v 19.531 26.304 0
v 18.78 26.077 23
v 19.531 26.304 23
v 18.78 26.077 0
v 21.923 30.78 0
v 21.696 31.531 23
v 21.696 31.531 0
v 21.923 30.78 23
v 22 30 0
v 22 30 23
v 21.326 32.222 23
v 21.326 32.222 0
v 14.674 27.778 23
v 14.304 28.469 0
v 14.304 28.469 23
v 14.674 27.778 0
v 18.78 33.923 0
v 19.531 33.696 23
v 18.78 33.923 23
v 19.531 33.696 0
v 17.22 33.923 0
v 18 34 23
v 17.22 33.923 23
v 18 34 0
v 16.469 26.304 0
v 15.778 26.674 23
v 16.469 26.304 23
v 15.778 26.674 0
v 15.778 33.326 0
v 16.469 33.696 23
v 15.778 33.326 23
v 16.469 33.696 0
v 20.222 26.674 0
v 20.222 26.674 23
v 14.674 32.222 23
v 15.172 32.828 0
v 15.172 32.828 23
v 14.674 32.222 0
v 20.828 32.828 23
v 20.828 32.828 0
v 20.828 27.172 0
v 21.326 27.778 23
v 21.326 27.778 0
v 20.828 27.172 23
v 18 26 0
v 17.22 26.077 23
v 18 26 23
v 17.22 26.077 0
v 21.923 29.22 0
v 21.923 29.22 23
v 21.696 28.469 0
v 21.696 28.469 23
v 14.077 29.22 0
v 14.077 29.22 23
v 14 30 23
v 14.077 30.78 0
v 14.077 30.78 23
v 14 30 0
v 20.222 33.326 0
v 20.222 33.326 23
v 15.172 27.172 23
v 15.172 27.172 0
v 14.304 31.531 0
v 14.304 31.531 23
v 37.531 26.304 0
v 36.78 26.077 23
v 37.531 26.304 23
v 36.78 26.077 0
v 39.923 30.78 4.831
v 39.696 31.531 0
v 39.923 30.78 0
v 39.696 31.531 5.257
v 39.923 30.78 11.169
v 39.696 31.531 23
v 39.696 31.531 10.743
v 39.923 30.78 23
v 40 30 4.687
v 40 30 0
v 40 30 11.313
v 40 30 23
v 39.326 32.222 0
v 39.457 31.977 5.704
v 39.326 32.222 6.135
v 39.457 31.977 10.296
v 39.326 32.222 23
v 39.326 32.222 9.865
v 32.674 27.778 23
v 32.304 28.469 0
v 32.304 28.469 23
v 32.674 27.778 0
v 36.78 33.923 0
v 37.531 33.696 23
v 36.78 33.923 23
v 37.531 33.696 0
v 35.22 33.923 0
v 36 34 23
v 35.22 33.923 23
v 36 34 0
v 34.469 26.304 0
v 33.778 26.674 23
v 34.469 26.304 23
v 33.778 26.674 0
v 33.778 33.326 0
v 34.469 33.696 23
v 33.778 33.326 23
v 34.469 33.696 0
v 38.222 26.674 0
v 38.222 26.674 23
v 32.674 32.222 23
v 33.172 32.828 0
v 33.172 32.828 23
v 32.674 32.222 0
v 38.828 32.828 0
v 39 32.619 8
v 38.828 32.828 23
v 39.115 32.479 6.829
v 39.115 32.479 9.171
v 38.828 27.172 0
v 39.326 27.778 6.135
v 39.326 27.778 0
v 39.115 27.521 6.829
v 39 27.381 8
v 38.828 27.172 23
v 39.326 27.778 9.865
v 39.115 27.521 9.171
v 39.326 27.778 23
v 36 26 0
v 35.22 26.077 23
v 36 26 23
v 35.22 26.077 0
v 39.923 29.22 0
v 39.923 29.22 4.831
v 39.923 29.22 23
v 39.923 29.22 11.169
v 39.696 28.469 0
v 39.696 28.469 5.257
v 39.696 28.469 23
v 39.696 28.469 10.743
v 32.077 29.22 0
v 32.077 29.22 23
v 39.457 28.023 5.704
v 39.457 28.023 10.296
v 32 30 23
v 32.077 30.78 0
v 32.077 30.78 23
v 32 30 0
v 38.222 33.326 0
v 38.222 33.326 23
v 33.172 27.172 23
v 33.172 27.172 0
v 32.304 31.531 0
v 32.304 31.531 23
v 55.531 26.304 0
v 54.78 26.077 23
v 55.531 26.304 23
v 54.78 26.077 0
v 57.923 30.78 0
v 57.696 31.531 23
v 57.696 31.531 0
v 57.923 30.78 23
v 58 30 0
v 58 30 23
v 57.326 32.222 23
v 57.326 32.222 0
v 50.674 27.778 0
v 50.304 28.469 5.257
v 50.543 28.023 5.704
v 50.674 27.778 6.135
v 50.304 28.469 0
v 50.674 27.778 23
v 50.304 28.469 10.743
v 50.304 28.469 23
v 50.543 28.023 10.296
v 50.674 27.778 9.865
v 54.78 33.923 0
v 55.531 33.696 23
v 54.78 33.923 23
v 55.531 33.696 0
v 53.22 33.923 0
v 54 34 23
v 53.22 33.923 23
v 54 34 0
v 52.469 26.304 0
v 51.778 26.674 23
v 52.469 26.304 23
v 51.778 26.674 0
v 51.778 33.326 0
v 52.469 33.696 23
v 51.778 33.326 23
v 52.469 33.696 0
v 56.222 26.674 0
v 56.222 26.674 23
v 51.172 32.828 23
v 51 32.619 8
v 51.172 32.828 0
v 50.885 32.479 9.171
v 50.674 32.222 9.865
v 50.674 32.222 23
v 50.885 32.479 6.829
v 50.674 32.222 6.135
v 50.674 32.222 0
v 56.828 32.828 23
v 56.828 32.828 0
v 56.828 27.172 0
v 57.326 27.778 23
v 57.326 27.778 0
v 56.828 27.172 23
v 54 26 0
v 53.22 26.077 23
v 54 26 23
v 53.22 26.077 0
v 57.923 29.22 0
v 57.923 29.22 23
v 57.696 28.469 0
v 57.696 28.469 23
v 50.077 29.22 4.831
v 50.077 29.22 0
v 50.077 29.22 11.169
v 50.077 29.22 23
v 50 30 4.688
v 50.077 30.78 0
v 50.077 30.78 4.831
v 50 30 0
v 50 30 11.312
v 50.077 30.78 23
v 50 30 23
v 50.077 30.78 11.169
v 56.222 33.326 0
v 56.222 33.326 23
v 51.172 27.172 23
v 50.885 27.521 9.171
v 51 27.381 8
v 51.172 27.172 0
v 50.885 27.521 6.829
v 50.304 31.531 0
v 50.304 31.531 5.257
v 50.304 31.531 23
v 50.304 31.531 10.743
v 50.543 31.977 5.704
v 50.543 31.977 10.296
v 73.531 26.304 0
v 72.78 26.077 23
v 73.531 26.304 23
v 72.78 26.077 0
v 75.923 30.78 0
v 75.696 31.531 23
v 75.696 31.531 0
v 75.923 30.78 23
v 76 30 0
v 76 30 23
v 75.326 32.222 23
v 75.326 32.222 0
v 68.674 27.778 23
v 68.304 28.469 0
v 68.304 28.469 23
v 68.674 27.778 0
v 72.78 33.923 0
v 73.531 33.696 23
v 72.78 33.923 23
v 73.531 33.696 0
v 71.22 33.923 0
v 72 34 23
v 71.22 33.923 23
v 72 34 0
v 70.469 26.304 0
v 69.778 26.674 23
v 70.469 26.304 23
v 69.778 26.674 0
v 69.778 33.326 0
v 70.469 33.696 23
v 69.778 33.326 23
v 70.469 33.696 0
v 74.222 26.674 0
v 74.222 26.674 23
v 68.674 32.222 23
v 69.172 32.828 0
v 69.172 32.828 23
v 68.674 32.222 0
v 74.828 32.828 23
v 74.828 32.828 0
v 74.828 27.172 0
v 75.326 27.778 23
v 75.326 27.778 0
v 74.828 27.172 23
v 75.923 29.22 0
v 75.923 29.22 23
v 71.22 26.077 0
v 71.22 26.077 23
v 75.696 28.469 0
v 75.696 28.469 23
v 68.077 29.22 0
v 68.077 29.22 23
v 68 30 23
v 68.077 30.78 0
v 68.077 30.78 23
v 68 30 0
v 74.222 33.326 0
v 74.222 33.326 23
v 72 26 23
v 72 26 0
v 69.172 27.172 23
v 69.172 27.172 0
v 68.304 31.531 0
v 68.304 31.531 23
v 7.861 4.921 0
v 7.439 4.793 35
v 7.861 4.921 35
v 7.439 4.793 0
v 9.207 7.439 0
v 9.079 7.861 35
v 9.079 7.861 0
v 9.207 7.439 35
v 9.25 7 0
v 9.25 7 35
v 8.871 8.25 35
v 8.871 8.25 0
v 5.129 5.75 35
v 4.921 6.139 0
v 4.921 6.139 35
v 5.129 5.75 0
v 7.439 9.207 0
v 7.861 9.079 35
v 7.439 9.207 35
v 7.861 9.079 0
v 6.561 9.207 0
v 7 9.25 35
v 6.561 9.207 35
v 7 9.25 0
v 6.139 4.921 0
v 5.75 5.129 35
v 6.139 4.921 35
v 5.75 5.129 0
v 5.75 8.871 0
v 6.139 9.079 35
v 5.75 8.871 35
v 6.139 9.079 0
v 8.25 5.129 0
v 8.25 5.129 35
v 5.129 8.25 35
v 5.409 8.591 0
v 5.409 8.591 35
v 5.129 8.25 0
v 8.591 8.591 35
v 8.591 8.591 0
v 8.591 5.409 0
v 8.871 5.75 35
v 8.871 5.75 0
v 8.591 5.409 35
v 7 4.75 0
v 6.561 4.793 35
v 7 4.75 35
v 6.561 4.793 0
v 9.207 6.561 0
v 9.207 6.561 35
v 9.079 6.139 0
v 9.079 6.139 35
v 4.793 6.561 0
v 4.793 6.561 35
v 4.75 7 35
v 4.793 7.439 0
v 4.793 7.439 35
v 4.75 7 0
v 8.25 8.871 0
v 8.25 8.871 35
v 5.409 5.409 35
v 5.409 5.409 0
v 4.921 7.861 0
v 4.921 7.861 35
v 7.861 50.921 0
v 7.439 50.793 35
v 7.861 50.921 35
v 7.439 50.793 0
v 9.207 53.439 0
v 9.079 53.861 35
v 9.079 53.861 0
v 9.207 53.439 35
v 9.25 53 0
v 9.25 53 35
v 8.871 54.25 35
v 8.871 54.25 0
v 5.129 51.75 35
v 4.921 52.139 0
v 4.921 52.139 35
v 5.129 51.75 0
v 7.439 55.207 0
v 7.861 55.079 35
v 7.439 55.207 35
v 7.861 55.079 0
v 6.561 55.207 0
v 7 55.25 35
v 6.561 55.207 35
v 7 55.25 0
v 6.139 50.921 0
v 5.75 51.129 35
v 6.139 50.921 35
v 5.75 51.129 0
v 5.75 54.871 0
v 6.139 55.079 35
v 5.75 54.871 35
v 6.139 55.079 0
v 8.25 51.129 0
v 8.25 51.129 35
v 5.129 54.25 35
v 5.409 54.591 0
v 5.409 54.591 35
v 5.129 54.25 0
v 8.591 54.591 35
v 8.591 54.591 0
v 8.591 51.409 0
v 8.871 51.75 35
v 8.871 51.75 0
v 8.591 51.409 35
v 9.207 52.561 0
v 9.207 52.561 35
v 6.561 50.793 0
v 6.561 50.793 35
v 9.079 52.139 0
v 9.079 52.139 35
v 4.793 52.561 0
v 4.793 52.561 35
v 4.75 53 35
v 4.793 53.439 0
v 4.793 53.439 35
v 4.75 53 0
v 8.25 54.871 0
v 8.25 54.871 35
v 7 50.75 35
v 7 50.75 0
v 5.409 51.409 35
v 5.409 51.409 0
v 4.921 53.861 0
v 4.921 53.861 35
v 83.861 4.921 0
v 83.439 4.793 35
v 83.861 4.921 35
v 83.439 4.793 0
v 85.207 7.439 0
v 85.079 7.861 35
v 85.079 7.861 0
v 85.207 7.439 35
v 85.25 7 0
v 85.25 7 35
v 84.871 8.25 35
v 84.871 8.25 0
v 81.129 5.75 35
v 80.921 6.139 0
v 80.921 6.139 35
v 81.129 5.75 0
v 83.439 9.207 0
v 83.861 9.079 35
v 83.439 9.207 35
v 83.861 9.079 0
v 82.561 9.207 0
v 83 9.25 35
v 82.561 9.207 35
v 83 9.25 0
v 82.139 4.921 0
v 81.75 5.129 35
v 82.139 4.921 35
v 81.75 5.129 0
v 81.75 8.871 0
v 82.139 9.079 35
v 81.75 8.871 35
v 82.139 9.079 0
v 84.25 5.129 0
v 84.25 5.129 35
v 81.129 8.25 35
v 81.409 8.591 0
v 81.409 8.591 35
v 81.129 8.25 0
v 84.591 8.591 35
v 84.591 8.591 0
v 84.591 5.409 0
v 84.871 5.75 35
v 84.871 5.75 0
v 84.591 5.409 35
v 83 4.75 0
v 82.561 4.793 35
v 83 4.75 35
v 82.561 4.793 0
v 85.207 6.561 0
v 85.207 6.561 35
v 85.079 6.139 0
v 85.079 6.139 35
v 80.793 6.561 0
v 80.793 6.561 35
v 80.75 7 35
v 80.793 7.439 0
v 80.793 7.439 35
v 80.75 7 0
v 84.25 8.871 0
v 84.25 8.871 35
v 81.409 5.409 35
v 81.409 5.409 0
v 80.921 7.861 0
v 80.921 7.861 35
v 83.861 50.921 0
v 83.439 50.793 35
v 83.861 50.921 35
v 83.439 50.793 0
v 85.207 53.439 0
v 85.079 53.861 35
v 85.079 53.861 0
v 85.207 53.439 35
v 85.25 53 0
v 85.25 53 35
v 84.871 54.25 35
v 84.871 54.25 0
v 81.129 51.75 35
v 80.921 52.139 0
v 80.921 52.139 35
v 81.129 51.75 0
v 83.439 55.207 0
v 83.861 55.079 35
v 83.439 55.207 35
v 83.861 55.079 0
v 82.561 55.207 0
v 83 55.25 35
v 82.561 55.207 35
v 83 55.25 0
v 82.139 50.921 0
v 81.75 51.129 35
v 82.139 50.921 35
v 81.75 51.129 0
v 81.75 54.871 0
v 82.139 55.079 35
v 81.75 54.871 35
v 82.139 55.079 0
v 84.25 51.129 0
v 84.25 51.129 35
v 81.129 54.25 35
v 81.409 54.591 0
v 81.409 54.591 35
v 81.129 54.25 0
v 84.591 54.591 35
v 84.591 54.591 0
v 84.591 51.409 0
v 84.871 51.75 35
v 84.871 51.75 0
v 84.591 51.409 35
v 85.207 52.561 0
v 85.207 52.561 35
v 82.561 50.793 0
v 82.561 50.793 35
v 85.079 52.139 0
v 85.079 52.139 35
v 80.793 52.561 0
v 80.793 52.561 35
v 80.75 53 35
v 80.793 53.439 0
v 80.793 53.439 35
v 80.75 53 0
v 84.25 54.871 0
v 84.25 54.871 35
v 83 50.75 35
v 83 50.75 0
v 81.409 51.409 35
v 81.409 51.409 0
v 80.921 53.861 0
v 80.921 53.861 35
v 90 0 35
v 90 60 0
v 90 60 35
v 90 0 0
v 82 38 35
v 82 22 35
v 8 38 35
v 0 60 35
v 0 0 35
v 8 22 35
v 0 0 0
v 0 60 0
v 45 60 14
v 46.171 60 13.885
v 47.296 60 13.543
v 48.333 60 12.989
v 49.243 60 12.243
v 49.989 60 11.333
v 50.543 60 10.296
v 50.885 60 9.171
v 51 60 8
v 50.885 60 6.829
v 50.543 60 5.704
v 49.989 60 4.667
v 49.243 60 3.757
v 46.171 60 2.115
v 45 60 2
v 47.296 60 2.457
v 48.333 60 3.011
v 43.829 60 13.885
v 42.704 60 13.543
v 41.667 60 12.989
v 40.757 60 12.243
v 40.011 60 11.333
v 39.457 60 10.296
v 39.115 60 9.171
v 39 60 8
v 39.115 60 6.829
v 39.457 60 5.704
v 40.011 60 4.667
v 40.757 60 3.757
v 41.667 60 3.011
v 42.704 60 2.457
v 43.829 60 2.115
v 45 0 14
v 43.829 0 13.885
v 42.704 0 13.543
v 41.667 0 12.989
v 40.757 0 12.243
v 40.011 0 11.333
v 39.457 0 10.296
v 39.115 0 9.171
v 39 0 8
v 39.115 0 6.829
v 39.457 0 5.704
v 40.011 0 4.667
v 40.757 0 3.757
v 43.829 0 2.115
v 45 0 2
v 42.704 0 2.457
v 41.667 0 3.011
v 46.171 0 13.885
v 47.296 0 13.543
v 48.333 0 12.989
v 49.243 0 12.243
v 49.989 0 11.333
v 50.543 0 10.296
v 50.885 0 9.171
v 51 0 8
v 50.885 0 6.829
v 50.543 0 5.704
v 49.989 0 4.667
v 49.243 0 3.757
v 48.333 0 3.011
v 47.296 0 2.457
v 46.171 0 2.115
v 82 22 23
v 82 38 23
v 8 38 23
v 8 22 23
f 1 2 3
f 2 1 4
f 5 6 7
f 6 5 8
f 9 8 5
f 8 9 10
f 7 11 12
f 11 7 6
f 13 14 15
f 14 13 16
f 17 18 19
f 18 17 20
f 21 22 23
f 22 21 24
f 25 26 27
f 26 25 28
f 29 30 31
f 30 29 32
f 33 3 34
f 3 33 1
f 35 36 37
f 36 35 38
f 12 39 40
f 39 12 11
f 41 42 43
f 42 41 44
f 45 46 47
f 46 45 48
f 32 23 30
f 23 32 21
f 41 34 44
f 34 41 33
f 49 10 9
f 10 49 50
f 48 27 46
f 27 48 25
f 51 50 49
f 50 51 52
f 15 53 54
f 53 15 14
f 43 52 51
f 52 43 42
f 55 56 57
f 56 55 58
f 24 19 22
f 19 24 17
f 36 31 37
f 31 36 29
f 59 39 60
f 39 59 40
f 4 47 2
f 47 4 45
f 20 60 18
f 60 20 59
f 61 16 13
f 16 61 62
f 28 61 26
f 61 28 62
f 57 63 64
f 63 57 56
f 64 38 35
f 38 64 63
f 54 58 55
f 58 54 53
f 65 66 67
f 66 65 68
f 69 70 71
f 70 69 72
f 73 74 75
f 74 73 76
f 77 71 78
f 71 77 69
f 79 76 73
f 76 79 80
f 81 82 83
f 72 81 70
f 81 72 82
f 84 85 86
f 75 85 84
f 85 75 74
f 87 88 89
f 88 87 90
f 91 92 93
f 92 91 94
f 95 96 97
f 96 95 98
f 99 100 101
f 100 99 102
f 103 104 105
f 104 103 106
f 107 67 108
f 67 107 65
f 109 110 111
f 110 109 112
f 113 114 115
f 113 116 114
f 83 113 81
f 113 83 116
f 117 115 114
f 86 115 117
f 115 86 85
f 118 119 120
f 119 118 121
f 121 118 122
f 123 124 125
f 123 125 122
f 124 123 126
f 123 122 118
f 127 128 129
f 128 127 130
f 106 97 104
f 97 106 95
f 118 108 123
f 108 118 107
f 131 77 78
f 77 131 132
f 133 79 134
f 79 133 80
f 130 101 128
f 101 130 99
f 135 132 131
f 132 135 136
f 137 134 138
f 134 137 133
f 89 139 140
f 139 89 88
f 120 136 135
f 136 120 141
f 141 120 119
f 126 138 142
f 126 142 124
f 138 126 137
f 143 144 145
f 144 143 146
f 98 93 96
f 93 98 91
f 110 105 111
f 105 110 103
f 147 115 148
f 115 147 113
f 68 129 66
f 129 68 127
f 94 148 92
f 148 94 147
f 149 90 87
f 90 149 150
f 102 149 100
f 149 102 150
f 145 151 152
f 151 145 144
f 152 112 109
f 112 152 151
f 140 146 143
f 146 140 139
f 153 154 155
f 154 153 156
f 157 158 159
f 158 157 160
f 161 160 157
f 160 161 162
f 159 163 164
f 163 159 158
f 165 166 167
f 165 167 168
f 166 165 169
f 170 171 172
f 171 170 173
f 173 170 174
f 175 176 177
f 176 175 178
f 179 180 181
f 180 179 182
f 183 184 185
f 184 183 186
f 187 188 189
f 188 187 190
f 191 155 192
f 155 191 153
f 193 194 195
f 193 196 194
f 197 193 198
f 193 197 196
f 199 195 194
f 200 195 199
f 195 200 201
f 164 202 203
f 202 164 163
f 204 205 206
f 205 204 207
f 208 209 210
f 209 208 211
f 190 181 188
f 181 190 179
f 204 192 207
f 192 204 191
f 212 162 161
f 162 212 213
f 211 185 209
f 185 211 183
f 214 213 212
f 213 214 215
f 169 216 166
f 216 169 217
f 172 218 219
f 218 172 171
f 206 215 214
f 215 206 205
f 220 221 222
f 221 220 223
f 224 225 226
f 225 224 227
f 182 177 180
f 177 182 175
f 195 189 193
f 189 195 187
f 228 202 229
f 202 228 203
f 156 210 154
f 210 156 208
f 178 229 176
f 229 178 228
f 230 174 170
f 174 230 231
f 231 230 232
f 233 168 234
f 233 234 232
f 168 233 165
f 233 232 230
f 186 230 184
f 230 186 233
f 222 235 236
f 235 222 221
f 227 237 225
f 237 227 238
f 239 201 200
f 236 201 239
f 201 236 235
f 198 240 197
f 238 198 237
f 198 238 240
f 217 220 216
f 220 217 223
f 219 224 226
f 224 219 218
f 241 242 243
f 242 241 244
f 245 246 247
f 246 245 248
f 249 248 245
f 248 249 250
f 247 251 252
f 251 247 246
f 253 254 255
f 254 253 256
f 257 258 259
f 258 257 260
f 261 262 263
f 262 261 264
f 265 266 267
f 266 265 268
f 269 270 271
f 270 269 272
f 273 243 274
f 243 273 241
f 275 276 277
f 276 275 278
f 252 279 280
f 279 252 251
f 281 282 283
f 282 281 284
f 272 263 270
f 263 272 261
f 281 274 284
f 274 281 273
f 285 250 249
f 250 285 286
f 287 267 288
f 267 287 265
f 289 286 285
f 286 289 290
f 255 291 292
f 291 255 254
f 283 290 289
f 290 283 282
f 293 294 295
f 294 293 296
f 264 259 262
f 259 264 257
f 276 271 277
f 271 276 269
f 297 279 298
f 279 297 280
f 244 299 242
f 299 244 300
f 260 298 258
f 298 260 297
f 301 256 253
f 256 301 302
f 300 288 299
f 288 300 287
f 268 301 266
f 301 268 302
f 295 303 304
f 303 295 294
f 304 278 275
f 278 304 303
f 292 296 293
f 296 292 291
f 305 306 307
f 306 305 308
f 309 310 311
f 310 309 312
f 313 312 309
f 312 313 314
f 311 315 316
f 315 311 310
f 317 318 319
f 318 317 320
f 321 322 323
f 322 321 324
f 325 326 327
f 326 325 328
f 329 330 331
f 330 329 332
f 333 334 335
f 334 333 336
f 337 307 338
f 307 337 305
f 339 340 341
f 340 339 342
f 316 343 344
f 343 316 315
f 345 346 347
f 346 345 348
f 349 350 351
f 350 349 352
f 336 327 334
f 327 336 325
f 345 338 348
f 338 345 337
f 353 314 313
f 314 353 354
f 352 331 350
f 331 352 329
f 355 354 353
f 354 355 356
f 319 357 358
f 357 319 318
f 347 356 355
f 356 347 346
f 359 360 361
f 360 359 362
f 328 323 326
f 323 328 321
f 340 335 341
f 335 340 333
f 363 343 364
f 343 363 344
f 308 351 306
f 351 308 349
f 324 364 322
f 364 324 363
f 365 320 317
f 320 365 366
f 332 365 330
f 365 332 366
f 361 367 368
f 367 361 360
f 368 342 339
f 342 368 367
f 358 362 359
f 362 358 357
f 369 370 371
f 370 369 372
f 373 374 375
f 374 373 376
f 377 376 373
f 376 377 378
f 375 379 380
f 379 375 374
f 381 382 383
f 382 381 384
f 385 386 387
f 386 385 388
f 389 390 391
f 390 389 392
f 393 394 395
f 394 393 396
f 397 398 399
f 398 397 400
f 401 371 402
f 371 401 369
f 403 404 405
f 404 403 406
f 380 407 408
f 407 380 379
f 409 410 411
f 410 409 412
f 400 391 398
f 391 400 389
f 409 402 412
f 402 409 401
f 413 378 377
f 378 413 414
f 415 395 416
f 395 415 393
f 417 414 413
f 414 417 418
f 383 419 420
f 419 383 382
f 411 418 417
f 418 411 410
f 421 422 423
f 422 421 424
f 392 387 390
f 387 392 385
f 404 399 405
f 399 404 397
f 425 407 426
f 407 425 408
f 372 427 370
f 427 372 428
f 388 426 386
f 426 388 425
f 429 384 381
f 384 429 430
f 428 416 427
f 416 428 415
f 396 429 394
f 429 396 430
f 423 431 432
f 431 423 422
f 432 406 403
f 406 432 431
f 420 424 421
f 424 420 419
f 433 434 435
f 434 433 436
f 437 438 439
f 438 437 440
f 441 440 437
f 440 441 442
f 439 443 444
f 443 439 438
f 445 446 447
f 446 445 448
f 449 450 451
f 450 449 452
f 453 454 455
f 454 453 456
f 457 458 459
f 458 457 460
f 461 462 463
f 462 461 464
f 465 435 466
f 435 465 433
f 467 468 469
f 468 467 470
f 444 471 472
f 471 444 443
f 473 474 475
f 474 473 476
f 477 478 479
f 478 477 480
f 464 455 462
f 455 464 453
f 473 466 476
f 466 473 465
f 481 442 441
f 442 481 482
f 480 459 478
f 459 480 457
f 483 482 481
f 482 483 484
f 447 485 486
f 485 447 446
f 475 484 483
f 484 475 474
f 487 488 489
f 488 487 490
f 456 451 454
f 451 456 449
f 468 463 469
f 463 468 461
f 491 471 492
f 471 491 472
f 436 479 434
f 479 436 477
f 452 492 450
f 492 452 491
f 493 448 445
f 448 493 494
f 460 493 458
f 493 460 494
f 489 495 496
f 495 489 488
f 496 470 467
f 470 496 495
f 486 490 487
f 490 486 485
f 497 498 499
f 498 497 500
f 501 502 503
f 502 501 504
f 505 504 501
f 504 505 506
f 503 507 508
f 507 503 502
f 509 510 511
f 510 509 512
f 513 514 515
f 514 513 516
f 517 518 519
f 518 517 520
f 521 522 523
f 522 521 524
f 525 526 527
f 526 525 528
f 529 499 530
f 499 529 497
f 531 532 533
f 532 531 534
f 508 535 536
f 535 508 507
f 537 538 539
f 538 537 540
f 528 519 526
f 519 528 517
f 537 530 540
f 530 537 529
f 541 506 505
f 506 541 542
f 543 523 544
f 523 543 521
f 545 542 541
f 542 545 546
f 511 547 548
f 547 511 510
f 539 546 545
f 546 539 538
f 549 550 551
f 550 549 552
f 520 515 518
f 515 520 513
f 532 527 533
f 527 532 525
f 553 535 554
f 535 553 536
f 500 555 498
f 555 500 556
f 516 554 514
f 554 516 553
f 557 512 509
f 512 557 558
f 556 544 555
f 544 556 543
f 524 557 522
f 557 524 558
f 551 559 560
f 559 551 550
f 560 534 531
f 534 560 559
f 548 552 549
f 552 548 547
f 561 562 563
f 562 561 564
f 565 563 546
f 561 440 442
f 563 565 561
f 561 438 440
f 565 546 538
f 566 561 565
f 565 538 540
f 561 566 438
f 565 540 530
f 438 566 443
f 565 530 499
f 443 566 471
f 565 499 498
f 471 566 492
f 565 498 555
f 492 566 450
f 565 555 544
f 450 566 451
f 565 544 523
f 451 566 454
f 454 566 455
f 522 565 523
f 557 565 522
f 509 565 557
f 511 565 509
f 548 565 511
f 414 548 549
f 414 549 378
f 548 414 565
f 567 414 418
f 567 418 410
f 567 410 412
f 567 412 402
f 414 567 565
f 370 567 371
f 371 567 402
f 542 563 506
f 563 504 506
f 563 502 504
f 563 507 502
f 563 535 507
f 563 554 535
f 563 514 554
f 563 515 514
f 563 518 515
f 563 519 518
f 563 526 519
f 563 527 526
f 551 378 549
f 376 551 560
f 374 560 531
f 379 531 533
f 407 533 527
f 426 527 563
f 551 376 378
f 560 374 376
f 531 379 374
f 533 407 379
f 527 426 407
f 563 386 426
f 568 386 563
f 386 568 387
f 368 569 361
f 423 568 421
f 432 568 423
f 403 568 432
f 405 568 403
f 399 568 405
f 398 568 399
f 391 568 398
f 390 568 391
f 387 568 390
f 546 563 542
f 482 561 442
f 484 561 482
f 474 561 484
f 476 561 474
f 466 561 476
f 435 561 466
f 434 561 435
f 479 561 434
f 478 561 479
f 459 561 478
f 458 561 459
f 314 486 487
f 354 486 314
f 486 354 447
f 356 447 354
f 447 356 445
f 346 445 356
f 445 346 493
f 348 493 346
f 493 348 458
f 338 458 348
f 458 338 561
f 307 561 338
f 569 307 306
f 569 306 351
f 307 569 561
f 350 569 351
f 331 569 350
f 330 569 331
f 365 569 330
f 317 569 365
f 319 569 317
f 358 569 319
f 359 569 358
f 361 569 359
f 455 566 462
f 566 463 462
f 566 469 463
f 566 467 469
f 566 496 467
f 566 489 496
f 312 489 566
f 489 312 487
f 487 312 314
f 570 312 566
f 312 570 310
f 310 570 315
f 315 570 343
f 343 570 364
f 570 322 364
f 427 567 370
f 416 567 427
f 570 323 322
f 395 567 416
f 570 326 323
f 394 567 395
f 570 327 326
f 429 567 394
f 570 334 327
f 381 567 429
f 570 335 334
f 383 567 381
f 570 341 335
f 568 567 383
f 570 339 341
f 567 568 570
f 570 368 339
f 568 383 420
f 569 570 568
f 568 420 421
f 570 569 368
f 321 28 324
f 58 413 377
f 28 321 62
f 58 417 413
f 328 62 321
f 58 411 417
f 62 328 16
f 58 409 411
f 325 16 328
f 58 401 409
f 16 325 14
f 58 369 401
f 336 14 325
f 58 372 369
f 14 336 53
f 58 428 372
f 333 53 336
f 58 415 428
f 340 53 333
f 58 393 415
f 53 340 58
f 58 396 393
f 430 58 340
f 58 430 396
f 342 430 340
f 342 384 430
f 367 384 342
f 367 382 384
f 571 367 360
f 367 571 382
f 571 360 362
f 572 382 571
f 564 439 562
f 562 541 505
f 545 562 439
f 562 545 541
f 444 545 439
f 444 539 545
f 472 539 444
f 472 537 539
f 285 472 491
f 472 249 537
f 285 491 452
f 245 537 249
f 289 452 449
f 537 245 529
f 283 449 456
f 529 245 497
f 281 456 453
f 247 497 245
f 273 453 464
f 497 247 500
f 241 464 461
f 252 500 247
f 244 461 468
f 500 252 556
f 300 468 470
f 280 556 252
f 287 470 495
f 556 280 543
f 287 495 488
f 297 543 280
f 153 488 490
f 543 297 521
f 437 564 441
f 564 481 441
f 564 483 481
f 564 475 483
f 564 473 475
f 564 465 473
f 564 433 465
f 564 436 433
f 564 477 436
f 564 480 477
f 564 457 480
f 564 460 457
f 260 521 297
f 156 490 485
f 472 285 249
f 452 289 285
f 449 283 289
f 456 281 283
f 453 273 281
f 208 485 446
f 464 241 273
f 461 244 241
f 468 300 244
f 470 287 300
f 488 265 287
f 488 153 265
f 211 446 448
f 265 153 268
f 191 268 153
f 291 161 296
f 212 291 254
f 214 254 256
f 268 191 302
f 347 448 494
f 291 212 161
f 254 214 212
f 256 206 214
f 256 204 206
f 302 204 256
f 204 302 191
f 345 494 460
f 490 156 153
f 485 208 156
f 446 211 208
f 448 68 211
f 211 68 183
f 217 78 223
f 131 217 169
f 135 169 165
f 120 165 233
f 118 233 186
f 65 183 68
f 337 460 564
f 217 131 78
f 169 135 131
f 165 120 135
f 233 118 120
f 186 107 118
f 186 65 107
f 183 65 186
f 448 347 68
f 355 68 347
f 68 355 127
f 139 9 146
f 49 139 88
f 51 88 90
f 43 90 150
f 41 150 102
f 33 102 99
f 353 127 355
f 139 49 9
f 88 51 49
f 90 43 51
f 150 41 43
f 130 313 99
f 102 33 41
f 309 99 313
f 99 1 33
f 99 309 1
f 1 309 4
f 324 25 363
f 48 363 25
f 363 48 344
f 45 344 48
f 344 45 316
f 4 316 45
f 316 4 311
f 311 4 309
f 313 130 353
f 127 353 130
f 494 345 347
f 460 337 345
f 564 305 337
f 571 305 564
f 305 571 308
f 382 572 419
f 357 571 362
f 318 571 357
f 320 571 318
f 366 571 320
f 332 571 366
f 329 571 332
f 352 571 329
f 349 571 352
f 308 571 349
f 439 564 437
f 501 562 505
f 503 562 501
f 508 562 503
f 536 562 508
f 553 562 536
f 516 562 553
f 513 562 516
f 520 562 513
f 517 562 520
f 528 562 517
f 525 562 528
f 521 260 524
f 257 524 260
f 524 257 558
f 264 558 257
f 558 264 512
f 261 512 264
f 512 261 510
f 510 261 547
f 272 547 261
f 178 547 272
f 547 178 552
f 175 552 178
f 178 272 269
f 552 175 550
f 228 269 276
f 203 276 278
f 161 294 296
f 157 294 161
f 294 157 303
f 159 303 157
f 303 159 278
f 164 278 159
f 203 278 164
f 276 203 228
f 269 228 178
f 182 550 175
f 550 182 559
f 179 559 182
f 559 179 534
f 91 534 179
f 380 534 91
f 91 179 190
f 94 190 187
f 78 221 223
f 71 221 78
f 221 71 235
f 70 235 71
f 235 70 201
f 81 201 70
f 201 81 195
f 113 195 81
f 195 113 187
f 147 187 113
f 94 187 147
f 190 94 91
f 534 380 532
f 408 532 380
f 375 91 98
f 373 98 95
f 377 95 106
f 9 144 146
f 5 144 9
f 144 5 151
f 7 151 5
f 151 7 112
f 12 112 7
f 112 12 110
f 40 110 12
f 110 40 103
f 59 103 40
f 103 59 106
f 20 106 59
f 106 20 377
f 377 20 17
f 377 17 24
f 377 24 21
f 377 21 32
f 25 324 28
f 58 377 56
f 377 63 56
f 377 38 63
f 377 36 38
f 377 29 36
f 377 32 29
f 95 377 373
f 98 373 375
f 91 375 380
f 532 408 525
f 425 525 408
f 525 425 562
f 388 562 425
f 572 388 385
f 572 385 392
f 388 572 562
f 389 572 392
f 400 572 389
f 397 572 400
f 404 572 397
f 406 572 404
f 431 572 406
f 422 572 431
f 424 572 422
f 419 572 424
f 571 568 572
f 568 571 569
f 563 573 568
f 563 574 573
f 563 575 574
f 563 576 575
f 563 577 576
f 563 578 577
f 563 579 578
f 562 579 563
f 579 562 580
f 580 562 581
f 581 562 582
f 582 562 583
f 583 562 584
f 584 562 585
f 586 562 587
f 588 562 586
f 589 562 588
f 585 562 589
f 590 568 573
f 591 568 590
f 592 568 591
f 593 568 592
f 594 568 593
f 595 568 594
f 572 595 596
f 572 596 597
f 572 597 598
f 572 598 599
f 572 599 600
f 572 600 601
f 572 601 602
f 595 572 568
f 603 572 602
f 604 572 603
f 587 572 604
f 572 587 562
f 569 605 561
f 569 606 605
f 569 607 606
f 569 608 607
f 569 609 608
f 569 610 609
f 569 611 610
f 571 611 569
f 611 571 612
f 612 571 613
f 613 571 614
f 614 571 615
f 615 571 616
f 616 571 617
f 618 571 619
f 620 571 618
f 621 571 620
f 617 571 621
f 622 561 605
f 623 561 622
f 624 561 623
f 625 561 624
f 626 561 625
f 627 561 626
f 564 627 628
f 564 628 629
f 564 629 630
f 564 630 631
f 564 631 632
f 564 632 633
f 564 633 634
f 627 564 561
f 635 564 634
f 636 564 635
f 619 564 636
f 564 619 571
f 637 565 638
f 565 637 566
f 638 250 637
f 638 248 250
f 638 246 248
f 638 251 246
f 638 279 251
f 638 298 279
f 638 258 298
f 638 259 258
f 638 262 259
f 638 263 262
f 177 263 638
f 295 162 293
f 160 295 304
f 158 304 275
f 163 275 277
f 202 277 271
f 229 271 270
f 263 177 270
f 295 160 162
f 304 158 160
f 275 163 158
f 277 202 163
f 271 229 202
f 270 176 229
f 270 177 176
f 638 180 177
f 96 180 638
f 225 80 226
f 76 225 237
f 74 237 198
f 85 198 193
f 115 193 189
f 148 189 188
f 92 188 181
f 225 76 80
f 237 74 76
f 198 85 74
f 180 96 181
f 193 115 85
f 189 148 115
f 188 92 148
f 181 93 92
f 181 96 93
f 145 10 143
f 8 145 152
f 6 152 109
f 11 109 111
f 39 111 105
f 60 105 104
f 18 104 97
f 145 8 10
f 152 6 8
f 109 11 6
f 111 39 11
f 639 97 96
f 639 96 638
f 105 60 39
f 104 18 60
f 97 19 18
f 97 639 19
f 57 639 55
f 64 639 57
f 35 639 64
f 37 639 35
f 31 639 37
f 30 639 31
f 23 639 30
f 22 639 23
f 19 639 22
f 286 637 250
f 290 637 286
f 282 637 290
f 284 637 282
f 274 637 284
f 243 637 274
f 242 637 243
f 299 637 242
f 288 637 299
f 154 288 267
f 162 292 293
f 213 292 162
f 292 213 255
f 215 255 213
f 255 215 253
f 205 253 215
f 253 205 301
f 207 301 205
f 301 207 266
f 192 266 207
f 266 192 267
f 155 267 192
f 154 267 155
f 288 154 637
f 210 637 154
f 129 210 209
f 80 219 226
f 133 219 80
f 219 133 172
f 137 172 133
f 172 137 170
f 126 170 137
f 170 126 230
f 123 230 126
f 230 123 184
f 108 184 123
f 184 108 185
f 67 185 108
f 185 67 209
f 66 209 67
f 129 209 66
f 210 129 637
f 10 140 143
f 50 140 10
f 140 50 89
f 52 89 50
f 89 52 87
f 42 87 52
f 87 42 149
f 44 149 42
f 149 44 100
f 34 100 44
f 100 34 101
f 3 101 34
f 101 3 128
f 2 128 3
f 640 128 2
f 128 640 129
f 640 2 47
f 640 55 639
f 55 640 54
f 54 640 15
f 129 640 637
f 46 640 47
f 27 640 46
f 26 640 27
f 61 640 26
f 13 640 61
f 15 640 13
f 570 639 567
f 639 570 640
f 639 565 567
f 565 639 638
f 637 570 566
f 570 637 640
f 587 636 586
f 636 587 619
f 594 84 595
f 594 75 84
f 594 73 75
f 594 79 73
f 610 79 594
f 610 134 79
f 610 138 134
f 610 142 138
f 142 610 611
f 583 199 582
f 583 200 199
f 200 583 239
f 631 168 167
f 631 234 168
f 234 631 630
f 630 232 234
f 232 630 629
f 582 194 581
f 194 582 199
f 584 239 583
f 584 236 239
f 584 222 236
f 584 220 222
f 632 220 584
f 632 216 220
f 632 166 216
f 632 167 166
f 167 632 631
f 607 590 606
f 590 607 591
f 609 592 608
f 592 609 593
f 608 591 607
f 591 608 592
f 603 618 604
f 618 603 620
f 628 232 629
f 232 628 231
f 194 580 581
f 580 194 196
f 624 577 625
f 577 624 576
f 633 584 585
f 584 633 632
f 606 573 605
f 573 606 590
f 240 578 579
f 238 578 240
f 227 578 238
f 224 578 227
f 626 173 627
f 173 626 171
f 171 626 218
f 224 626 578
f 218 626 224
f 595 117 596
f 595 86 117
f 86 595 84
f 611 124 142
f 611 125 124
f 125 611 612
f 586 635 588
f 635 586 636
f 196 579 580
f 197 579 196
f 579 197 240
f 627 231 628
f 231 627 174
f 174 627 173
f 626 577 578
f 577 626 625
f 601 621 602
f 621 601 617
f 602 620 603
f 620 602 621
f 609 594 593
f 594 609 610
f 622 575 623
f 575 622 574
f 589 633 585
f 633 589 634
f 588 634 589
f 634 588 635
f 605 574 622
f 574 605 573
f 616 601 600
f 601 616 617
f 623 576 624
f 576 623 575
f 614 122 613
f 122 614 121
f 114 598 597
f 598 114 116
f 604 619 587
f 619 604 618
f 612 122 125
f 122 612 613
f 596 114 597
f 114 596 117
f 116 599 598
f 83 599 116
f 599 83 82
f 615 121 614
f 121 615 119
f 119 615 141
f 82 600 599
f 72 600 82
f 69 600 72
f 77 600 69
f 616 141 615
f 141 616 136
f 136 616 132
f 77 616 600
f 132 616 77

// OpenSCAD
$fn = 32;

// ----------------------------------------------------------------------
// Manifold block: side_outlet manifold
// ----------------------------------------------------------------------

// --- parameters (mm) ---
block_l = 90;             // block length, X
block_w = 60;             // block width, Y
block_h = 35;             // block height, Z
port_d = 8;               // port bore diameter
port_pitch = 18;          // port pitch along X
gallery_d = 16;           // top gallery width, Y
gallery_depth = 12;       // gallery pocket depth
wall_p = 8;               // gallery end wall thickness, X
mnt_d = 4.5;              // mounting hole diameter
mnt_in = 7;               // mounting hole inset from the edges
out_d = 12;               // outlet bore diameter
out_z = 8;                // outlet axis height

n_ports = 4;  // ports in the row
port_x0 = (block_l - (n_ports - 1) * port_pitch) / 2;  // first port X

difference() {
  cube([block_l, block_w, block_h]);
  for (i = [0 : n_ports - 1])
    translate([port_x0 + i * port_pitch, block_w / 2, -1])
      cylinder(h = block_h + 2, d = port_d);
  translate([wall_p, block_w / 2 - gallery_d / 2, block_h - gallery_depth])
    cube([block_l - 2 * wall_p, gallery_d, gallery_depth + 1]);
  for (cx = [mnt_in, block_l - mnt_in])
    for (cy = [mnt_in, block_w - mnt_in])
      translate([cx, cy, -1]) cylinder(h = block_h + 2, d = mnt_d);
  translate([block_l / 2, -1, out_z]) rotate([-90, 0, 0])
    cylinder(h = block_w + 2, d = out_d);
}
